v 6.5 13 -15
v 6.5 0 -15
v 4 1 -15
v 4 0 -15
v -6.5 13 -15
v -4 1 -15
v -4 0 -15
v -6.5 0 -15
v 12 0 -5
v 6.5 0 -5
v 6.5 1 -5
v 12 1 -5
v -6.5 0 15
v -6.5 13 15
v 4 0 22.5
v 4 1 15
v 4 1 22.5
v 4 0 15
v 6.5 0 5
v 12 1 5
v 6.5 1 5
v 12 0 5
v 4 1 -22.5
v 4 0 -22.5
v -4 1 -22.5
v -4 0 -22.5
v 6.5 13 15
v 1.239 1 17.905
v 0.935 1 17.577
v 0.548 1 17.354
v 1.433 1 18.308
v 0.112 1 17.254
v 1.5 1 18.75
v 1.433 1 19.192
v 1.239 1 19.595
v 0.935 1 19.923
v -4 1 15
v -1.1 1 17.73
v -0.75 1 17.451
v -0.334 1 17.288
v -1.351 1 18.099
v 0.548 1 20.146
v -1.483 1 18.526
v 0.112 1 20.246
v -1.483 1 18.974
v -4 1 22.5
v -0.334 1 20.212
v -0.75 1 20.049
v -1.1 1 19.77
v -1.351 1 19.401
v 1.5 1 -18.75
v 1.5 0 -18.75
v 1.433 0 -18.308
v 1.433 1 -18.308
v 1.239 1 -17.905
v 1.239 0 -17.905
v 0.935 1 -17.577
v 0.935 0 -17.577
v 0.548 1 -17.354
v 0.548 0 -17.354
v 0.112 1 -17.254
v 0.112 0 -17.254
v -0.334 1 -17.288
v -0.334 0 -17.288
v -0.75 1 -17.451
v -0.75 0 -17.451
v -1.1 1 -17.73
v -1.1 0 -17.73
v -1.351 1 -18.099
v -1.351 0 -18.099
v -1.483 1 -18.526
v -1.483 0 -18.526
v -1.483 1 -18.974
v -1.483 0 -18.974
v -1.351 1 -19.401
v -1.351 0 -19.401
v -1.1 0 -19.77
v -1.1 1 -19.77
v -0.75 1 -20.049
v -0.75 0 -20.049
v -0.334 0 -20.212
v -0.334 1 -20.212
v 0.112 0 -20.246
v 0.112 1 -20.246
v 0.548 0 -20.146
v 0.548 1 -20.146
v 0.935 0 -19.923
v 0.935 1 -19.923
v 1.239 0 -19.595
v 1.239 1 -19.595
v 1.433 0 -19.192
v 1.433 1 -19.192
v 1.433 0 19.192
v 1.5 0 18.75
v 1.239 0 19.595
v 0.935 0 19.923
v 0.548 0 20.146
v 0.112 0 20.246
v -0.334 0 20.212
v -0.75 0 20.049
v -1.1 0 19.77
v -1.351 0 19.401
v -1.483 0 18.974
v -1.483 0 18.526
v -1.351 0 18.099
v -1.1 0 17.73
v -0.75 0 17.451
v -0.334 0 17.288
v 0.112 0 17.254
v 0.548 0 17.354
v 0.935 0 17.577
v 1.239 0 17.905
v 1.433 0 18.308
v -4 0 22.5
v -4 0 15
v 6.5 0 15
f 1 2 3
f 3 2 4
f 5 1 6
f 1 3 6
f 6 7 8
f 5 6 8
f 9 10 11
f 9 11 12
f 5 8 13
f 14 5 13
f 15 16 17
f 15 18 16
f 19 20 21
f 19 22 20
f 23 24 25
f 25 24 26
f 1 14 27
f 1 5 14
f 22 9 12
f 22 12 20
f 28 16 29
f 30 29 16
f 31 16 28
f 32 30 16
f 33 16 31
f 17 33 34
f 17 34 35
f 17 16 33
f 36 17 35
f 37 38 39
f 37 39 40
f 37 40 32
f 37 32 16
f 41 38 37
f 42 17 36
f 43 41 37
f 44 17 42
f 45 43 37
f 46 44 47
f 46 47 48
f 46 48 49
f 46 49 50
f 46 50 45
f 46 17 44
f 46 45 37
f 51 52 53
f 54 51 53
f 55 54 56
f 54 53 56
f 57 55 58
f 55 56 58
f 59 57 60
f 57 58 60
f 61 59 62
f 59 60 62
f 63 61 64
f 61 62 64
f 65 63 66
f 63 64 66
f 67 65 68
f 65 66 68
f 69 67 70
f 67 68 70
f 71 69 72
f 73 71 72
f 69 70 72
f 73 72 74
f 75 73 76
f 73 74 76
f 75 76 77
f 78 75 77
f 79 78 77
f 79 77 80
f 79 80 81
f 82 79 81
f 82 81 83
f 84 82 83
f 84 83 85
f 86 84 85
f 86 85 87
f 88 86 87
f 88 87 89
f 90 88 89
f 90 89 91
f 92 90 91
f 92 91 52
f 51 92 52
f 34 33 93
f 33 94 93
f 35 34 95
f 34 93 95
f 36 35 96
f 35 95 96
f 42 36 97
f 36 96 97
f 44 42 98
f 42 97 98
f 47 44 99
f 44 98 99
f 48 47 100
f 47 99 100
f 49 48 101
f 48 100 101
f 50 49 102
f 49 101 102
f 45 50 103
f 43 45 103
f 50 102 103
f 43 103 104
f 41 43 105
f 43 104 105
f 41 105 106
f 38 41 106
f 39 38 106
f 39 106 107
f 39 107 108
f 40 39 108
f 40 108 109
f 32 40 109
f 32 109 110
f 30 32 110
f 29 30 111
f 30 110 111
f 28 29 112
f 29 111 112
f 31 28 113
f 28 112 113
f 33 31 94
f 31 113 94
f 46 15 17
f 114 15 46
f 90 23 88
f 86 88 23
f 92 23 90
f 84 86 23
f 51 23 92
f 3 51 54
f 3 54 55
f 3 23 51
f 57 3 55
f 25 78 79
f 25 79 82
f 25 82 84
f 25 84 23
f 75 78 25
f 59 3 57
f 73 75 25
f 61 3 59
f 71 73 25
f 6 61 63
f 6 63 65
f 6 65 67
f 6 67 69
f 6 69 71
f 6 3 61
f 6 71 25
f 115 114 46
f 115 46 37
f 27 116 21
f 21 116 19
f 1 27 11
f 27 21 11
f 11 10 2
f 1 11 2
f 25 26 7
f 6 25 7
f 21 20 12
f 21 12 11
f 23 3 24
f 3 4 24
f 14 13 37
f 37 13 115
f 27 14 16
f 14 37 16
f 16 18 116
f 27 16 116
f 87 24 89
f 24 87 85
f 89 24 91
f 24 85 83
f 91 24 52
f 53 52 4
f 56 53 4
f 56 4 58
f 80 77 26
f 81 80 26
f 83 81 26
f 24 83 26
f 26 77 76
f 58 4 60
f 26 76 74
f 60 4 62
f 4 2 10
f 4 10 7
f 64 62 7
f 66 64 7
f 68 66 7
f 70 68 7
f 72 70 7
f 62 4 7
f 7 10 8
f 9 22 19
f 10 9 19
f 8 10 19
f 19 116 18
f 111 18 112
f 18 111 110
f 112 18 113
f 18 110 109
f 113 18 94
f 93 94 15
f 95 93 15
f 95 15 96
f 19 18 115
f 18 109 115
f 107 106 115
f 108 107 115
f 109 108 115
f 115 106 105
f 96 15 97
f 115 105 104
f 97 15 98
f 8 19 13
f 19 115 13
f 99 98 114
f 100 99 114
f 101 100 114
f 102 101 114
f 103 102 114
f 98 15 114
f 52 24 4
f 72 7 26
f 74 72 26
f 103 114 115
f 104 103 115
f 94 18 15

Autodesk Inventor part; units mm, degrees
ref_plane "YZ Plane" through (0, 0, 0) normal (1, 0, 0) x (0, 1, 0)
ref_plane "XZ Plane" through (0, 0, 0) normal (0, 1, 0) x (-1, 0, 0)
ref_plane "XY Plane" through (0, 0, 0) normal (0, 0, 1) x (1, 0, 0)
sketch "Esquisse1" plane through (0, 0, 0) normal (0, 1, 0) x (-1, 0, 0)
  line L0 (6.5, 15) -> (-6.5, 15)
  line L1 (-6.5, 15) -> (-6.5, -15)
  line L2 (-6.5, -15) -> (6.5, -15)
  line L3 (6.5, -15) -> (6.5, 15)
  line L4 (4, 15) -> (-4, 15)
  line L5 (-4, 15) -> (-4, 22.5)
  line L6 (-4, 22.5) -> (4, 22.5)
  line L7 (4, 22.5) -> (4, 15)
  line L8 (4, -15) -> (-4, -15)
  line L9 (-4, -15) -> (-4, -22.5)
  line L10 (-4, -22.5) -> (4, -22.5)
  line L11 (4, -22.5) -> (4, -15)
  line L12 (-6.5, -5) -> (-12, -5)
  line L13 (-12, -5) -> (-12, 5)
  line L14 (-12, 5) -> (-6.5, 5)
  line L15 (-6.5, 5) -> (-6.5, -5)
  point P0 (0, 0)
  dimension "d0" = 30
  dimension "d1" = 15
  dimension "d2" = 13
  dimension "d3" = 6.5
  dimension "d4" = 45
  dimension "d5" = 22.5
  dimension "d6" = 8
  dimension "d7" = 4
  dimension "d8" = 5.5
  dimension "d9" = 10
  dimension "d10" = 5
extrude "Extrusion1" add sketch "Esquisse1" along normal blind 1
sketch "Esquisse2" plane through (0, 1, 0) normal (0, 1, 0) x (1, 0, 0)
  line L0 (-6.5, -15) -> (6.5, -15)
  line L1 (6.5, -15) -> (6.5, 15)
  line L2 (6.5, 15) -> (-6.5, 15)
  line L3 (-6.5, 15) -> (-6.5, -15)
  point P0 (0, 0)
extrude "Extrusion2" add sketch "Esquisse2" along normal blind 12
sketch "Esquisse3" plane through (0, 0, 0) normal (0, -1, 0) x (1, 0, 0)
  line L0 (-4, 22.5) -> (4, 22.5) construction
  line L1 (4, 22.5) -> (4, 15) construction
  line L2 (4, 15) -> (-4, 15) construction
  line L3 (-4, 15) -> (-4, 22.5) construction
  line L4 (-4, -15) -> (4, -15) construction
  line L5 (4, -15) -> (4, -22.5) construction
  line L6 (4, -22.5) -> (-4, -22.5) construction
  line L7 (-4, -22.5) -> (-4, -15) construction
  line L8 (-4, 15) -> (4, 22.5) construction
  line L9 (4, 15) -> (-4, 22.5) construction
  line L10 (-4, -22.5) -> (4, -15) construction
  line L11 (-4, -15) -> (4, -22.5) construction
  circle A0 centre (0, -18.75) radius 1.5
  circle A1 centre (0, 18.75) radius 1.5
  point P0 (0, 0)
  dimension "d15" = 3
  dimension "d16" = 3
extrude "Extrusion3" cut sketch "Esquisse3" against normal through all
equation "\"d1\" = 0.5 * d0"
equation "\"d3\" = 0.5 * d2"
equation "\"d5\" = 0.5 * d4"
equation "\"d7\" = 0.5 * d6"
equation "\"d10\" = 0.5 * d9"
equation "\"d16\" = d15"
properties part number "gp2"
